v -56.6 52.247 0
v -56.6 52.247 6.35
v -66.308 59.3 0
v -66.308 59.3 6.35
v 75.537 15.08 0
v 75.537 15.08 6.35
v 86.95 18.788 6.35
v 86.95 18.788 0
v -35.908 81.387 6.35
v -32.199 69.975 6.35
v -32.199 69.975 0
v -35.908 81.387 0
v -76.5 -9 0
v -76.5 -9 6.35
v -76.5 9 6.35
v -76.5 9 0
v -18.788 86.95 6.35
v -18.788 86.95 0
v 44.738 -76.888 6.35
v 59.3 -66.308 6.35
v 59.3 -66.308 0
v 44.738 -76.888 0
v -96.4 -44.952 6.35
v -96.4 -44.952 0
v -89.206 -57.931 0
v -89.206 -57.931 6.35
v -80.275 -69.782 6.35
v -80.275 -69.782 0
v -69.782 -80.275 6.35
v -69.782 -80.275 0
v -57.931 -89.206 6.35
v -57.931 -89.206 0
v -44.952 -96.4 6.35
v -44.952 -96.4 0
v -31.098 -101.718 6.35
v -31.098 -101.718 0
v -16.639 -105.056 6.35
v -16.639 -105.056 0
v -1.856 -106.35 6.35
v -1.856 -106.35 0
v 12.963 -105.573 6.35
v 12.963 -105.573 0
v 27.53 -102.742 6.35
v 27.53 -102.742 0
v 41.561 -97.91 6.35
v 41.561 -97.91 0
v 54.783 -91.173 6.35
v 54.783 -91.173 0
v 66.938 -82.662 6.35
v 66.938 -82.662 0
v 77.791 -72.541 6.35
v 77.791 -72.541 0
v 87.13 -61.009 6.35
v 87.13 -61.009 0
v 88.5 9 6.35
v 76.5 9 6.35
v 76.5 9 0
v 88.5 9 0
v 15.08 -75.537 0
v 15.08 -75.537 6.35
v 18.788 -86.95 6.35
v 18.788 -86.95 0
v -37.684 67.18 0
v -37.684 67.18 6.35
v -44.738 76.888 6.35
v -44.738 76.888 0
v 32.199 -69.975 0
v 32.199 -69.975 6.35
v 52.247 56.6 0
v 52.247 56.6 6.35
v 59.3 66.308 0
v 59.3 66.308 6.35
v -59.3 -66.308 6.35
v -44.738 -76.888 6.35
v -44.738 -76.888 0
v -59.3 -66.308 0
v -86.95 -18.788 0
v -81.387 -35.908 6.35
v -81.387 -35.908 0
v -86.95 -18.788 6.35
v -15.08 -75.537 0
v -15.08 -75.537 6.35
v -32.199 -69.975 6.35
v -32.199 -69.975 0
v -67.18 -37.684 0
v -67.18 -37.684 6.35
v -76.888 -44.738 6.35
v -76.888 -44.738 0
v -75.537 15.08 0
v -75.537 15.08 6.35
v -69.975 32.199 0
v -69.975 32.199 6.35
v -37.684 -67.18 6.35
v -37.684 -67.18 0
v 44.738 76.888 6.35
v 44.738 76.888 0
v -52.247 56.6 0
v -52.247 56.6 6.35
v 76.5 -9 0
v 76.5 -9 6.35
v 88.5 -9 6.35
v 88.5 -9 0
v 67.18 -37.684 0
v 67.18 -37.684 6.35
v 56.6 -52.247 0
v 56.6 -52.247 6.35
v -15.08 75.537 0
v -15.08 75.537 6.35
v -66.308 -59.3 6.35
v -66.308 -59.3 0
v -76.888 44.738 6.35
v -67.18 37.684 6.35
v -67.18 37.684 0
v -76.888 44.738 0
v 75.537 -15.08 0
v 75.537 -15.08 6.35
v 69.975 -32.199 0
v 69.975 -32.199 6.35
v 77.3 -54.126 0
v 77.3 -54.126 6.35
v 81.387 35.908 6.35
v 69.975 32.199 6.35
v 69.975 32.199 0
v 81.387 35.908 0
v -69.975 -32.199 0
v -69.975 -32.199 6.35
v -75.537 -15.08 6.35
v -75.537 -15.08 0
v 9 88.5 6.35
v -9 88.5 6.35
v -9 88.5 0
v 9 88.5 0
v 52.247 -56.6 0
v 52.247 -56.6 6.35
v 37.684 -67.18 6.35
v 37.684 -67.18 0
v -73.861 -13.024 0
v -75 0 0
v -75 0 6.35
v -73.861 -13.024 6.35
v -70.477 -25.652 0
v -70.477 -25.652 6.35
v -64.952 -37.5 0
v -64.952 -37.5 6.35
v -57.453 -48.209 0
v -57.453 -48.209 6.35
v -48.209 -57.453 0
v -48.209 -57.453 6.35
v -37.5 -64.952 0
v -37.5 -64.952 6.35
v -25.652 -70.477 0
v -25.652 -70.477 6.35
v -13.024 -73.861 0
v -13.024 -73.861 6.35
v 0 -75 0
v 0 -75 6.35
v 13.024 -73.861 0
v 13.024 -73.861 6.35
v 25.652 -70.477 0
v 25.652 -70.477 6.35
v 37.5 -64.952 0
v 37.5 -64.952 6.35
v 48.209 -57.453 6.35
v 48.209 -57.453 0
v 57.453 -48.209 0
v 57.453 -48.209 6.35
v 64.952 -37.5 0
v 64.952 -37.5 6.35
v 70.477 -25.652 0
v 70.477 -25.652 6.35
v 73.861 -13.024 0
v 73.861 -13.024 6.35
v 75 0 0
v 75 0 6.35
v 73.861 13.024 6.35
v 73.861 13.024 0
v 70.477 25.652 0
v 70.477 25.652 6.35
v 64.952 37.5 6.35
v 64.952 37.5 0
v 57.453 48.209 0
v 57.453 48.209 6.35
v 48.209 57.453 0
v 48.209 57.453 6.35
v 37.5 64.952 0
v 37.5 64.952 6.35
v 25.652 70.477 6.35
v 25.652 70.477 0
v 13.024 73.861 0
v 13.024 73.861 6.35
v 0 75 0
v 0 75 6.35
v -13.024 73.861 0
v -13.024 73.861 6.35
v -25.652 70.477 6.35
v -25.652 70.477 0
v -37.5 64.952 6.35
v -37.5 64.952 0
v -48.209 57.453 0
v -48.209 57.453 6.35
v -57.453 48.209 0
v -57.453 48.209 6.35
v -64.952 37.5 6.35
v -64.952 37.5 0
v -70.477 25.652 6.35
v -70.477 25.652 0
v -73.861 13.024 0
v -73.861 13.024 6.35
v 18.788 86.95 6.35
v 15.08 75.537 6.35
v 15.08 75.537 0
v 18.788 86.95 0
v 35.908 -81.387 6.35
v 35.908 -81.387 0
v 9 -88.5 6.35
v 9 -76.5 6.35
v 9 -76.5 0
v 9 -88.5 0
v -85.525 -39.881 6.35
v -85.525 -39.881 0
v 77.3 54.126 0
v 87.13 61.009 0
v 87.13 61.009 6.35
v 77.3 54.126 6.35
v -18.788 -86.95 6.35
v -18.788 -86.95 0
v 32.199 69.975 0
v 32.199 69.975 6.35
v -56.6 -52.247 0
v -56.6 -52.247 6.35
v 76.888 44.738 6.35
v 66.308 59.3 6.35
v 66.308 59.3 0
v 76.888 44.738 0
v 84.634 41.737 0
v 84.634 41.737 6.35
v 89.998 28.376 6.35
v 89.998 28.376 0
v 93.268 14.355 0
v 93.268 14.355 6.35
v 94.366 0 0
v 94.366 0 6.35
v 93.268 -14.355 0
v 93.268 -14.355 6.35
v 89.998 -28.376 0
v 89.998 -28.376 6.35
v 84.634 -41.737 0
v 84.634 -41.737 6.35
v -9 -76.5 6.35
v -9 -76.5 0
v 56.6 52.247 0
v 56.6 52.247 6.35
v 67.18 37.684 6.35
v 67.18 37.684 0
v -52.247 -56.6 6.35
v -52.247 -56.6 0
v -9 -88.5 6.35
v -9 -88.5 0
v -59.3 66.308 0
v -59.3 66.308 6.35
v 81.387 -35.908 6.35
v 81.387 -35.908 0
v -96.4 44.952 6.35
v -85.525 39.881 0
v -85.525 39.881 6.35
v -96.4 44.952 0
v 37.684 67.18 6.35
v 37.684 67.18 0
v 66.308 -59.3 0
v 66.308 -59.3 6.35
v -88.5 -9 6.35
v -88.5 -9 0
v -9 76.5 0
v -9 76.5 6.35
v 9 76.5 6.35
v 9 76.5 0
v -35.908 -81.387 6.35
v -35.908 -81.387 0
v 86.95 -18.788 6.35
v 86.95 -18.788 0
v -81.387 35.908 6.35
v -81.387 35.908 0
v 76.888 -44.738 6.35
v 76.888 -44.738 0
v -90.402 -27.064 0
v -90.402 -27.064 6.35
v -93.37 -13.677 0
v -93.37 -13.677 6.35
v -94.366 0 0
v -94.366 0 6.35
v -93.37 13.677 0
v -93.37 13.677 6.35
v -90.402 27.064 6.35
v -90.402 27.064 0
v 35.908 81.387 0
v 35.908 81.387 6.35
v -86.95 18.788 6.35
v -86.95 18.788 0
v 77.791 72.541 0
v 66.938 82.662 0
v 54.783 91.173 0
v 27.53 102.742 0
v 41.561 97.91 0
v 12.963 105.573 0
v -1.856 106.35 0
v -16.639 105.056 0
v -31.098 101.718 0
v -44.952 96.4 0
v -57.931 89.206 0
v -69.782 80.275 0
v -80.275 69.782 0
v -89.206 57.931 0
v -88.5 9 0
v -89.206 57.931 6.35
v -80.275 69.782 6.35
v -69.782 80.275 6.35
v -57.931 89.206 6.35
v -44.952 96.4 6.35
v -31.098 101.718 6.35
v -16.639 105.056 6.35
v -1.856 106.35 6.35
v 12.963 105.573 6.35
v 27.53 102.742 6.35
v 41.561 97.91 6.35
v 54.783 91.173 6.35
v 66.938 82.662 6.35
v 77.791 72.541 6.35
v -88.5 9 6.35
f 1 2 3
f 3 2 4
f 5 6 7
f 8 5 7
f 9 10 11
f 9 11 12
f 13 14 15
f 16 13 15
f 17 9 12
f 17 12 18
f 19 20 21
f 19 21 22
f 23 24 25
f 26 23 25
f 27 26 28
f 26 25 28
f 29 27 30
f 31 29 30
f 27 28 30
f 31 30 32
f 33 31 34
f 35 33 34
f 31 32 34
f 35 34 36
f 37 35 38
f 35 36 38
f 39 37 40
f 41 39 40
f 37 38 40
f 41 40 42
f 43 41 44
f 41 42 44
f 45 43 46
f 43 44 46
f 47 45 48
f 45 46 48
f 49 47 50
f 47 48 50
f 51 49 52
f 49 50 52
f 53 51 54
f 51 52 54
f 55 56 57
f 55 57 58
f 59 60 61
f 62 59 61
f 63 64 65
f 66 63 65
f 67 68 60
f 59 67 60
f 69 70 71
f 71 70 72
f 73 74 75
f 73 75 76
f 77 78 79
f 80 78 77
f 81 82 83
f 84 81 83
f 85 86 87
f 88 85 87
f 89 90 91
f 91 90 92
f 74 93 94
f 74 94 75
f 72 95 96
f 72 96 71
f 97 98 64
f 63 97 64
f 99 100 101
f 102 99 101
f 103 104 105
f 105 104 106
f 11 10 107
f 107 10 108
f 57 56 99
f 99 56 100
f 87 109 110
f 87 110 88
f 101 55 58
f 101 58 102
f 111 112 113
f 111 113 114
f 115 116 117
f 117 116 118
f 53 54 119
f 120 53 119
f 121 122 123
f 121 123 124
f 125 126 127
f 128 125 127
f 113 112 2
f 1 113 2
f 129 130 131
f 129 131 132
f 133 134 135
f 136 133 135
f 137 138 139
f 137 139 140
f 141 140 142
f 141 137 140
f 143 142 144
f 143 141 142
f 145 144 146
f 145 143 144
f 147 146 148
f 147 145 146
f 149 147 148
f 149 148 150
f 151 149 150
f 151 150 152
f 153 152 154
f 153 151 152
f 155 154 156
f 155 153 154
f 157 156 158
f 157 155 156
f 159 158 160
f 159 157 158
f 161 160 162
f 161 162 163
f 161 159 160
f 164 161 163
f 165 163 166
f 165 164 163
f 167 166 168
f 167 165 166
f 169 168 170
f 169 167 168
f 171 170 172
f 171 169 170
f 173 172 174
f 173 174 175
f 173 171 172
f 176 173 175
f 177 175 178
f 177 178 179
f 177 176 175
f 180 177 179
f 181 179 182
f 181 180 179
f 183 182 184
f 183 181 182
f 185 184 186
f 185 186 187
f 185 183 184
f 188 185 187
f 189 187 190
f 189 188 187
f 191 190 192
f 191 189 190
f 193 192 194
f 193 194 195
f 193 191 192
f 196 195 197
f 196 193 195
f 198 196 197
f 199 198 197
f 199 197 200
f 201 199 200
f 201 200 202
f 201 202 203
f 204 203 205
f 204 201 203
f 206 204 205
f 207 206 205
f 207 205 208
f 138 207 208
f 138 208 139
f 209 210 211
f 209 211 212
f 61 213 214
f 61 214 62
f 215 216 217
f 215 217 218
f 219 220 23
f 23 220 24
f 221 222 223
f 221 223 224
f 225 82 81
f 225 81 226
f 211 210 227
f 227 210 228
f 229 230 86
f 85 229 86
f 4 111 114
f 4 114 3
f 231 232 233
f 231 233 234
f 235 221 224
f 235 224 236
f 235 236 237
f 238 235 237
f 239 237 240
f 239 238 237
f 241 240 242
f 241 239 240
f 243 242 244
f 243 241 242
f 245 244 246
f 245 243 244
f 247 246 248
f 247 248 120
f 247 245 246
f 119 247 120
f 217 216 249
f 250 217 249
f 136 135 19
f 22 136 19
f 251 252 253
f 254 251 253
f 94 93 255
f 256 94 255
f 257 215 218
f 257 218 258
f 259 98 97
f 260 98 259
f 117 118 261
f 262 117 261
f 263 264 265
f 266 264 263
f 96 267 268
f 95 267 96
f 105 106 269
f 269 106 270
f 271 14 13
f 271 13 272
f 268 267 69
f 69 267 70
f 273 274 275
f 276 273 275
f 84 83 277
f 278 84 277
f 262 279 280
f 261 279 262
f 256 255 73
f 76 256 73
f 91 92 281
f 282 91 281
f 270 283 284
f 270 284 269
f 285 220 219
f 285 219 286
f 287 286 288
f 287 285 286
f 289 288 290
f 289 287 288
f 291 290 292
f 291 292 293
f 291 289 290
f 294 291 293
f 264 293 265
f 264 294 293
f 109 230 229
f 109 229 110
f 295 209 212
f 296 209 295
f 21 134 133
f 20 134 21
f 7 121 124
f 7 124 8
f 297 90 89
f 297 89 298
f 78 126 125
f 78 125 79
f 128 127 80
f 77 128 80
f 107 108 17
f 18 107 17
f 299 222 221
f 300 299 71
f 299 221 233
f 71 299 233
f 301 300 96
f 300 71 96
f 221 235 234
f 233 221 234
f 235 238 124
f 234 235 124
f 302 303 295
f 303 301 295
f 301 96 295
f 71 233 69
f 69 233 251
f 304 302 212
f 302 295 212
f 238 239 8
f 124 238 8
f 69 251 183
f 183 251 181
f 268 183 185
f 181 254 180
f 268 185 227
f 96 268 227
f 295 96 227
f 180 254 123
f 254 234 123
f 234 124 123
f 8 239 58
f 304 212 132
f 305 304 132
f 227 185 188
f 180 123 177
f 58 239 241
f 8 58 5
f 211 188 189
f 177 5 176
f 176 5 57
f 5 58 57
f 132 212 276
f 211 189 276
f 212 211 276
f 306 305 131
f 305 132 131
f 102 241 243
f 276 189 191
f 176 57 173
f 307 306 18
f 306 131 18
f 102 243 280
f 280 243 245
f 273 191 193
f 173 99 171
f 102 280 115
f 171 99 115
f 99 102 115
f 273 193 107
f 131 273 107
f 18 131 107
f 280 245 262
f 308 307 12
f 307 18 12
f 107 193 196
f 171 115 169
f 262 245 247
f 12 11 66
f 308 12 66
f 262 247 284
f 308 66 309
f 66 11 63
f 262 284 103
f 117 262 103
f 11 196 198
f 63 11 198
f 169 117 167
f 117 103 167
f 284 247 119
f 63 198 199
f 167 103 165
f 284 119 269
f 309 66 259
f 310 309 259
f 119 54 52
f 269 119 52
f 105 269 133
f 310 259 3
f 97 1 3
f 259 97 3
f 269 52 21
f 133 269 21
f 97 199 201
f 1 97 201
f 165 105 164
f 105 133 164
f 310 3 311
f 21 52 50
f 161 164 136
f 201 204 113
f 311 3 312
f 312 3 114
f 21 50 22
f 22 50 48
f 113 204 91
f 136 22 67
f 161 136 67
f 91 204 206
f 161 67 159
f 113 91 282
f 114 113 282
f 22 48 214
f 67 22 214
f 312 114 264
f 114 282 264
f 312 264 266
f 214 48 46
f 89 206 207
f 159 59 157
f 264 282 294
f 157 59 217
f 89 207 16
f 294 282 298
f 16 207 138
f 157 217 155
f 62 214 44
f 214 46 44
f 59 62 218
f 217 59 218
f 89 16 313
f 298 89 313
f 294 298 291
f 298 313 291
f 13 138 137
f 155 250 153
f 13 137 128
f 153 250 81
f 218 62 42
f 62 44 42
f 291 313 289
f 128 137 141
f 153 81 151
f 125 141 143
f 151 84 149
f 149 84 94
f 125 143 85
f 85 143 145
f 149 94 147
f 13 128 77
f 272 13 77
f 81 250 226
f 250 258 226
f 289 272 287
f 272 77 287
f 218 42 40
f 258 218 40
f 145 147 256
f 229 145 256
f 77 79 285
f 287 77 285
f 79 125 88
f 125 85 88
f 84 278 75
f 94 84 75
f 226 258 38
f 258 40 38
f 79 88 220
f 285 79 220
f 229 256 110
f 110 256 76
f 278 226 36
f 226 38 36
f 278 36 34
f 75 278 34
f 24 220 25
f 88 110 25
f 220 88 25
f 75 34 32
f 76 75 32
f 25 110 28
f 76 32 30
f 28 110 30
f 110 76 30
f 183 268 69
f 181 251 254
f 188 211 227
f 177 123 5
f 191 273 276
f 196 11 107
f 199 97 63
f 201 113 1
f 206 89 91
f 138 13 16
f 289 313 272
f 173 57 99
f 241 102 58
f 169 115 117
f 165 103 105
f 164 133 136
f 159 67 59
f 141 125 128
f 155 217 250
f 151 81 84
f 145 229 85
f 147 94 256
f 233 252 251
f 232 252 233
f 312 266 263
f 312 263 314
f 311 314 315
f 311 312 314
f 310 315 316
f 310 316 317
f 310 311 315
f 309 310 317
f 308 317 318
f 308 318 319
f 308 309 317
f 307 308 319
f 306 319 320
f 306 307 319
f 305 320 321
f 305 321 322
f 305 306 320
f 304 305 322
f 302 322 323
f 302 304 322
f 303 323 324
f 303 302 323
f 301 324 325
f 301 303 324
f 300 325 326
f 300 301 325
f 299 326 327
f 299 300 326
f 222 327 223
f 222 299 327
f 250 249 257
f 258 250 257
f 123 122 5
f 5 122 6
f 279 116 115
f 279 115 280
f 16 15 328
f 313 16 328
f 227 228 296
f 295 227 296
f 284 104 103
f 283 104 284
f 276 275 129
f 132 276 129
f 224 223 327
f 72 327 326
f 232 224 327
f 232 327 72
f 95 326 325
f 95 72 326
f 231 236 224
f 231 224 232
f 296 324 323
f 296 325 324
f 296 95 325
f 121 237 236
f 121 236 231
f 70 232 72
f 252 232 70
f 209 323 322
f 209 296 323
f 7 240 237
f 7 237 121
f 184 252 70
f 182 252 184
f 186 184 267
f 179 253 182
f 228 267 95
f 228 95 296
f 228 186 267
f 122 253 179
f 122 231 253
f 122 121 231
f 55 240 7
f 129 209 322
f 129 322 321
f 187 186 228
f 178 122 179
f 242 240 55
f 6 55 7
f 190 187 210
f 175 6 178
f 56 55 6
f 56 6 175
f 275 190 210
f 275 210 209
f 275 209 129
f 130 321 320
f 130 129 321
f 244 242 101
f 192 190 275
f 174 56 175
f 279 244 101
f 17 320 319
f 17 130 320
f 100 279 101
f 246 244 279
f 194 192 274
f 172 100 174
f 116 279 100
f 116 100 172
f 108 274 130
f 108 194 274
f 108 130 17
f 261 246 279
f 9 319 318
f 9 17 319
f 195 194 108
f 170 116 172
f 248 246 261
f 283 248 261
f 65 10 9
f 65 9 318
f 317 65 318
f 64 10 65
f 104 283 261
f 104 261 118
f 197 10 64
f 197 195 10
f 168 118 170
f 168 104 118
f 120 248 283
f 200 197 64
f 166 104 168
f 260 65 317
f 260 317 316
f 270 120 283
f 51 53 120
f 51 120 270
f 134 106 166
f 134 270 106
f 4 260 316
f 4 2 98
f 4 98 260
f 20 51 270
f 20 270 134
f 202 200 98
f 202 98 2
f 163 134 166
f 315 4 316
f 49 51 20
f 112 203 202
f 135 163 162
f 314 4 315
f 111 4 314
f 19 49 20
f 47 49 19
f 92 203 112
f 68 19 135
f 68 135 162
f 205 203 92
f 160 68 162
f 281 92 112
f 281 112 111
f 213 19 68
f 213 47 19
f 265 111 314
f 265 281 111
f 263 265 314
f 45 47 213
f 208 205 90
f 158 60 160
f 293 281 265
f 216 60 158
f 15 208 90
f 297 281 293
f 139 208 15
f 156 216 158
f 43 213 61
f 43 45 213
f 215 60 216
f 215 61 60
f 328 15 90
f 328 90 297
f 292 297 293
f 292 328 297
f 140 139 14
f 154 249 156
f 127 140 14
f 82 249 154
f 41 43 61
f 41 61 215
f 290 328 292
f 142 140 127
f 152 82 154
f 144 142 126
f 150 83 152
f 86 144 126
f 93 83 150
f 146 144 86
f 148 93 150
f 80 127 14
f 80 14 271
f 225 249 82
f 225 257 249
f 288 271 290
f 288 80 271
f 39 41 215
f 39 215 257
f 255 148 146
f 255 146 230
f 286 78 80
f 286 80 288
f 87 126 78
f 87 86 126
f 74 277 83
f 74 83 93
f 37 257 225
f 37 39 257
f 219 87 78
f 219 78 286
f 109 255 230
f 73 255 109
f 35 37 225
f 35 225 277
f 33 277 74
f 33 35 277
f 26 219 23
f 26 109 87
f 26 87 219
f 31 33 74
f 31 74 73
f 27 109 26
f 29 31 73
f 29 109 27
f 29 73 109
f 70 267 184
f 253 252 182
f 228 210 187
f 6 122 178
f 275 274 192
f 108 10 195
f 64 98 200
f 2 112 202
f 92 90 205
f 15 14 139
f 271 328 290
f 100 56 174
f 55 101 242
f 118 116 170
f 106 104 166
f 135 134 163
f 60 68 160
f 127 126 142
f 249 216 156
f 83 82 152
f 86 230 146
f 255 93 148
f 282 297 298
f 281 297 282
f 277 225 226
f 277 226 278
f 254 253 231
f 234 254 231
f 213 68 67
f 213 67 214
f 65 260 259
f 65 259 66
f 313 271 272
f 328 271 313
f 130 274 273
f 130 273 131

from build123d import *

# Parameters (mm, degrees)
SKETCH1_R           = 75
BOSS_EXTRUDE1_DEPTH = 6.35
SKETCH2_W           = 18
SKETCH2_H           = 12
CUT_EXTRUDE1_DEPTH  = 144.69092772
CIRPATTERN1_COUNT   = 20


with BuildPart() as part:
    # Sketch1 → Boss-Extrude1 (new body)
    with BuildSketch(Plane.XY):
        with BuildLine():
            Line((-85.524663655, 39.880805624), (-96.4003571, 44.952224764))
            ThreePointArc((-96.4003571, 44.952224764), (-9.270409947, 105.961270564), (87.129947152, 61.0090458))
            Line((87.129947152, 61.0090458), (77.300122621, 54.126128564))
            ThreePointArc((77.300122621, 54.126128564), (8.224541034, -94.006934187), (-85.524663655, 39.880805624))
        make_face()
        with Locations(Location((0, 0, 0), (0, 0, 180))):
            Circle(SKETCH1_R, mode=Mode.SUBTRACT)
    boss_extrude1 = extrude(amount=BOSS_EXTRUDE1_DEPTH)

    # Mirror1: Boss-Extrude1 across plane
    add(boss_extrude1.mirror(Plane.ZX))

    # Sketch2 → Cut-Extrude1 (cut, through all)
    with BuildSketch(Plane.XY.offset(6.35)):
        with Locations((0, 82.5)):
            Rectangle(SKETCH2_W, SKETCH2_H)
    cut_extrude1 = extrude(amount=-CUT_EXTRUDE1_DEPTH, mode=Mode.SUBTRACT)

    # CirPattern1: Cut-Extrude1 ×20 about axis
    cirpattern1_axis = Axis((0, 0, 0), (0, 0, 1))
    for i in range(1, CIRPATTERN1_COUNT):
        add(cut_extrude1.rotate(cirpattern1_axis, i * 360 / CIRPATTERN1_COUNT), mode=Mode.SUBTRACT)


solid = part.part
